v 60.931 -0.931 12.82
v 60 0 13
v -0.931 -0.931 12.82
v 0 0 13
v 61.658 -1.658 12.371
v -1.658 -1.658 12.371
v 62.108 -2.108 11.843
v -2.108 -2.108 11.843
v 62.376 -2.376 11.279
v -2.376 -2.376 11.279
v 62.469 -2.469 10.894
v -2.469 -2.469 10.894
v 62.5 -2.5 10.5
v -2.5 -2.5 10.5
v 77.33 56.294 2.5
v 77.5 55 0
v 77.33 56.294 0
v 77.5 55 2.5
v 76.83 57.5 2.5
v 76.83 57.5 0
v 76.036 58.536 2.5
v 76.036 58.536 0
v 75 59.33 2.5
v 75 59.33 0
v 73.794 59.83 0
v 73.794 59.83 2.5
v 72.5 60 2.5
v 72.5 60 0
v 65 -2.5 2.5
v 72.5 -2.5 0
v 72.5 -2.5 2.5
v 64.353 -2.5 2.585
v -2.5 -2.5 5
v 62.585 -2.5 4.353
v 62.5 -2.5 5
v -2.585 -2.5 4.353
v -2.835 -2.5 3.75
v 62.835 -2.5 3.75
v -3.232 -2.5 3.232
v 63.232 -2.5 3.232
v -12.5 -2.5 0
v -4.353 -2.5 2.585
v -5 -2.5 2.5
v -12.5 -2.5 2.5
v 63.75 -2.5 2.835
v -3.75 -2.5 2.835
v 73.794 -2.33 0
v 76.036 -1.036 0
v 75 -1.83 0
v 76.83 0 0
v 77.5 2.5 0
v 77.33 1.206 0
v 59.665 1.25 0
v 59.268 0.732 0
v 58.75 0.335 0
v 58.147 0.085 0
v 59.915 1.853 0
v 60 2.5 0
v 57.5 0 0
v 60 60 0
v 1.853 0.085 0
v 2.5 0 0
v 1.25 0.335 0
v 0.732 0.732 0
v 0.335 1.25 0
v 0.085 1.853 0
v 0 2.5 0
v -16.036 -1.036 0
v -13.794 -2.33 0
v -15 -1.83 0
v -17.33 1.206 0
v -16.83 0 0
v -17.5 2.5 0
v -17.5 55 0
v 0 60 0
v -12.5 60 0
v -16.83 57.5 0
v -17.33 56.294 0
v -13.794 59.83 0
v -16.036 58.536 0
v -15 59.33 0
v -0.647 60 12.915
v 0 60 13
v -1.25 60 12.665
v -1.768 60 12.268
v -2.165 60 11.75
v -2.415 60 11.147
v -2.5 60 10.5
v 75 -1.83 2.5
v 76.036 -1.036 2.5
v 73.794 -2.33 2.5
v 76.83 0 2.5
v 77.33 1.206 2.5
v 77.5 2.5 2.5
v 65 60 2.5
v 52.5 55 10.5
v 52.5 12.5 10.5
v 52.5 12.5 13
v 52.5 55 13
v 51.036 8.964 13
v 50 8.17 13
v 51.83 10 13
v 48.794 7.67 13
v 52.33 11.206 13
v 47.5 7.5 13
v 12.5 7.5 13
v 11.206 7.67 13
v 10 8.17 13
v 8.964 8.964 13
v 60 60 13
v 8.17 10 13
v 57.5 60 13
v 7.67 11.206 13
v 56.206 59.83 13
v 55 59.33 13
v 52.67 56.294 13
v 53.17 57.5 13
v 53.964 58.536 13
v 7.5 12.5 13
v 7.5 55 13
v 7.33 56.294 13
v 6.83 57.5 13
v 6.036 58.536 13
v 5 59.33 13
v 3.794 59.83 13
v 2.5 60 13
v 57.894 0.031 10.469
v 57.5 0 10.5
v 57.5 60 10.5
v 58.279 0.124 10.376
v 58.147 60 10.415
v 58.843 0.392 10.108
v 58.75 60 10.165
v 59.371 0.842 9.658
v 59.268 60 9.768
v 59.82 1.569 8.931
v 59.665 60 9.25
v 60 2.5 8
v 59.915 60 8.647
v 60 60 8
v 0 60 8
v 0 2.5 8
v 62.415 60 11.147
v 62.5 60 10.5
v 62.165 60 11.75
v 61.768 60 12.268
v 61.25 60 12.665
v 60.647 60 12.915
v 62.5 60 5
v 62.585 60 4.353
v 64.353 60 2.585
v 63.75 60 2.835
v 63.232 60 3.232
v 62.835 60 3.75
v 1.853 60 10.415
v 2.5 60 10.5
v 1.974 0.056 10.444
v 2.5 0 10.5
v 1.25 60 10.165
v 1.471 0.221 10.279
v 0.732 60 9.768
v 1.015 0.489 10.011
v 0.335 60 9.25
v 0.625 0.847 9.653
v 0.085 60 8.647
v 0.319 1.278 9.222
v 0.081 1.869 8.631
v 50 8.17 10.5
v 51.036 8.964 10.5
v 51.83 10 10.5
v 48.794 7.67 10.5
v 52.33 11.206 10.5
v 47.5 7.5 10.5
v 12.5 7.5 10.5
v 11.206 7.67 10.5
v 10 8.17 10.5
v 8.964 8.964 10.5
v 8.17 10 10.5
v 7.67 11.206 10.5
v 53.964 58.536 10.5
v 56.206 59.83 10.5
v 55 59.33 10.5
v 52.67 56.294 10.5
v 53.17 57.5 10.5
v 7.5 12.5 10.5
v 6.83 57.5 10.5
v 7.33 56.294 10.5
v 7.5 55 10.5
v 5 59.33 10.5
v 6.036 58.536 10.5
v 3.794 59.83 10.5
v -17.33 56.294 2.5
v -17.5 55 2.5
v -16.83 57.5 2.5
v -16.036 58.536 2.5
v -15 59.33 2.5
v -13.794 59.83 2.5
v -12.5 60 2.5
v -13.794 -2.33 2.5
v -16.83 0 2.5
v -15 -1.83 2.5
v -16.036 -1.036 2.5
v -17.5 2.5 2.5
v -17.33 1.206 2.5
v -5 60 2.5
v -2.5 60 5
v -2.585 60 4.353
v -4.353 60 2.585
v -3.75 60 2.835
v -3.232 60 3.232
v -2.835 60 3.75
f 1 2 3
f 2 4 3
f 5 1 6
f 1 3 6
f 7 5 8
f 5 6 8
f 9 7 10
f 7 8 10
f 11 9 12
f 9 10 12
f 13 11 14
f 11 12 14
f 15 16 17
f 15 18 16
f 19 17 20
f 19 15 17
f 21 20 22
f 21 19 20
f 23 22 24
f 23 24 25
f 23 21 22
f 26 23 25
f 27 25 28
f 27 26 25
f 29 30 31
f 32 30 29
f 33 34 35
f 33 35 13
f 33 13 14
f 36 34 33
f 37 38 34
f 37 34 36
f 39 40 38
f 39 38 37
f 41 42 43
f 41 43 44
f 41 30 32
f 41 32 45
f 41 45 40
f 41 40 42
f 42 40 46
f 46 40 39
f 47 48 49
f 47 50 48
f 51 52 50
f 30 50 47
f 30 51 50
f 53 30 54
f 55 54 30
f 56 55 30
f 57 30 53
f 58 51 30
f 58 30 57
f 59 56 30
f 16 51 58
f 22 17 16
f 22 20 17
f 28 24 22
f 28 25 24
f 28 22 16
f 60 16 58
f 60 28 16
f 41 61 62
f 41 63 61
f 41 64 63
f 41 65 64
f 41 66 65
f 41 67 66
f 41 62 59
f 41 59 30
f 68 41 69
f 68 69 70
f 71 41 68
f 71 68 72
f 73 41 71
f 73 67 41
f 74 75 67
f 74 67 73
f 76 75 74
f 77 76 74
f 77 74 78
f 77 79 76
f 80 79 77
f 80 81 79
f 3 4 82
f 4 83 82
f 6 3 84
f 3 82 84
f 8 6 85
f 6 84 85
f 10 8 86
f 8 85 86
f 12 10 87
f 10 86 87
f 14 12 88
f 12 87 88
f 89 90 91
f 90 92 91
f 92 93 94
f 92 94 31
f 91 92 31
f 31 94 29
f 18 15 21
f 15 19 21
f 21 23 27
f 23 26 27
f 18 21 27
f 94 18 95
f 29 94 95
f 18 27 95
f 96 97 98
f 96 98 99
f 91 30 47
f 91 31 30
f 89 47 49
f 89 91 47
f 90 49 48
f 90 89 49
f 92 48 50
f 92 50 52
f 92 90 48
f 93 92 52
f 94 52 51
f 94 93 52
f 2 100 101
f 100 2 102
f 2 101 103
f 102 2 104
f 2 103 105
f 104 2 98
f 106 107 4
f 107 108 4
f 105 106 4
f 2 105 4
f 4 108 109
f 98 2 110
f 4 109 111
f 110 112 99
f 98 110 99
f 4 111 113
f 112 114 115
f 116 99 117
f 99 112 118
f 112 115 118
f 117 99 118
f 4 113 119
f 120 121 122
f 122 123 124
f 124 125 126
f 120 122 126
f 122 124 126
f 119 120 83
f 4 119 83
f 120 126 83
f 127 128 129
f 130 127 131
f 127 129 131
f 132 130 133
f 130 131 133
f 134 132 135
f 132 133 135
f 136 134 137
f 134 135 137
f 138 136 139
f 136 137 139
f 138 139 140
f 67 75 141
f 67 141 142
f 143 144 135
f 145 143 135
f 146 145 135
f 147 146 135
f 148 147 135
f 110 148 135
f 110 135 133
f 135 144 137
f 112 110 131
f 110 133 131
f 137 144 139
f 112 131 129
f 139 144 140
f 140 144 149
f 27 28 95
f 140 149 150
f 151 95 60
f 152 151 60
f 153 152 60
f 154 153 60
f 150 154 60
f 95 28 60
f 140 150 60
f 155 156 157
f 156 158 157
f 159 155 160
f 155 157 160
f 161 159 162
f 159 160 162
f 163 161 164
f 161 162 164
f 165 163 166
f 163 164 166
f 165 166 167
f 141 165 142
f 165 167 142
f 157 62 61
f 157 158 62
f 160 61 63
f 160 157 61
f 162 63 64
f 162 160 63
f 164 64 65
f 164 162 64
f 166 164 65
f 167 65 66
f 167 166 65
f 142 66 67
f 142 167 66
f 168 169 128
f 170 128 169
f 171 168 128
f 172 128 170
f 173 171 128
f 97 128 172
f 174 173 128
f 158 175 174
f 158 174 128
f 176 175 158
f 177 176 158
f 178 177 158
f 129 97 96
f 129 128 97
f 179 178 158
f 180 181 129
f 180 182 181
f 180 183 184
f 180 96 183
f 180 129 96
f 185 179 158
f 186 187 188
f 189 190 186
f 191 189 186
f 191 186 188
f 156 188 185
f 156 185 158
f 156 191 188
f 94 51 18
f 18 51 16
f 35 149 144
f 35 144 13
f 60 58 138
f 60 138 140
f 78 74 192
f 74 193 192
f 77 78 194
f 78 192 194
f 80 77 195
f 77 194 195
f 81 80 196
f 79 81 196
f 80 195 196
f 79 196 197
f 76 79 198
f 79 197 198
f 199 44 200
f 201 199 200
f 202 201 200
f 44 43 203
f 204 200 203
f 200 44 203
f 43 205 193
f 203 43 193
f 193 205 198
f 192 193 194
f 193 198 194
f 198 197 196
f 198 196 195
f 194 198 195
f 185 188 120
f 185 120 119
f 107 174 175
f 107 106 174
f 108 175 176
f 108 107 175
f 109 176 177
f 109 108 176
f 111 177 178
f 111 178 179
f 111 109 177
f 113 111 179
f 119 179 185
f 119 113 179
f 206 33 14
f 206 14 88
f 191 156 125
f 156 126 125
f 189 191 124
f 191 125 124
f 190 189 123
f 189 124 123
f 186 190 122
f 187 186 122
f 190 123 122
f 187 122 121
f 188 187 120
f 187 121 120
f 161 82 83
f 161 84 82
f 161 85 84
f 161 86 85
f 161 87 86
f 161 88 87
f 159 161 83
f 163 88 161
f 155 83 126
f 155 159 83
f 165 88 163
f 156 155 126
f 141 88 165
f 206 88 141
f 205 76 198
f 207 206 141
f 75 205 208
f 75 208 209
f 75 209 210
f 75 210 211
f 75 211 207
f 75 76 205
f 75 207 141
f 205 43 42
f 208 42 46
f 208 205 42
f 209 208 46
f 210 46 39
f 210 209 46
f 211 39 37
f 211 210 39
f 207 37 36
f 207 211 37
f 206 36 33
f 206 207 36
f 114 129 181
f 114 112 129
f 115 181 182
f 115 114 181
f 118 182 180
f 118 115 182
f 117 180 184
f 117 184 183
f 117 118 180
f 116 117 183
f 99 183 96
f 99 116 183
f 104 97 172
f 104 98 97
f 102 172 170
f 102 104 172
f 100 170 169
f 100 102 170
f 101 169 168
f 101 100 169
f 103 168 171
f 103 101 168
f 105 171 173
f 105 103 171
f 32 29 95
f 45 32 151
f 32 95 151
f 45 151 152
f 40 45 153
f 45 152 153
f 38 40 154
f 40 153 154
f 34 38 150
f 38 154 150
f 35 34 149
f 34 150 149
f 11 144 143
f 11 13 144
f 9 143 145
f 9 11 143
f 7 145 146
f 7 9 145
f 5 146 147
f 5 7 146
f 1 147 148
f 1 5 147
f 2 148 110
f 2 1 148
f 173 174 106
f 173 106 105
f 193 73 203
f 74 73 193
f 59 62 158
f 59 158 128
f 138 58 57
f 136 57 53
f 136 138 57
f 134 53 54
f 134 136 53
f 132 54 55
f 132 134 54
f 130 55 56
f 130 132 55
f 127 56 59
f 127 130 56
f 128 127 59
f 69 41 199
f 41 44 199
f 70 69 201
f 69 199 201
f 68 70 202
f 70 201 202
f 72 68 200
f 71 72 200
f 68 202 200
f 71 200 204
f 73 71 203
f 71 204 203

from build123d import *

# Parameters (mm, degrees)
BOSS_EXTRUDE1_DEPTH = 10.5
BOSS_EXTRUDE2_DEPTH = 2.5
SKETCH3_W           = 15
SKETCH3_H           = 62.5
BOSS_EXTRUDE3_DEPTH = 2.5
FILLET1_R           = 2.5
FILLET2_R           = 5


with BuildPart() as part:
    # Sketch1 → Boss-Extrude1 (new body)
    with BuildSketch(Plane.XY):
        Polygon((60, 60), (62.5, 60), (62.5, -2.5), (-2.5, -2.5), (-2.5, 60), (0, 60), (0, 0), (60, 0), align=None)
    extrude(amount=BOSS_EXTRUDE1_DEPTH)

    # Sketch2 → Boss-Extrude2 (add)
    with BuildSketch(Plane.XY.offset(10.5)):
        Polygon((52.5, 60), (62.5, 60), (62.5, -2.5), (-2.5, -2.5), (-2.5, 60), (7.5, 60), (7.5, 7.5), (52.5, 7.5), align=None)
    extrude(amount=BOSS_EXTRUDE2_DEPTH)

    # Sketch3 → Boss-Extrude3 (add)
    with BuildSketch(Plane(origin=(0, 0, 0), x_dir=(-1, 0, 0), z_dir=(0, 0, -1))):
        with Locations((-70, 28.75)):
            Rectangle(SKETCH3_W, SKETCH3_H)
        with Locations((10, 28.75)):
            Rectangle(SKETCH3_W, SKETCH3_H)
    extrude(amount=-BOSS_EXTRUDE3_DEPTH)

    # Fillet1
    fillet1_edges = [part.edges().sort_by_distance(p)[0] for p in [
        (0, 0, 5.25),
        (60, 0, 5.25),
        (60, 30, 10.5),
        (-2.5, 28.75, 13),
        (30, -2.5, 13),
        (62.5, 28.75, 13),
        (0, 30, 10.5),
        (62.5, 28.75, 2.5),
        (-2.5, 28.75, 2.5),
    ]]
    fillet(fillet1_edges, radius=FILLET1_R)

    # Fillet2
    fillet2_edges = [part.edges().sort_by_distance(p)[0] for p in [
        (7.5, 7.5, 11.75),
        (52.5, 7.5, 11.75),
        (-17.5, 60, 1.25),
        (-17.5, -2.5, 1.25),
        (77.5, -2.5, 1.25),
        (77.5, 60, 1.25),
        (52.5, 60, 11.75),
        (7.5, 60, 11.75),
    ]]
    fillet(fillet2_edges, radius=FILLET2_R)


solid = part.part
